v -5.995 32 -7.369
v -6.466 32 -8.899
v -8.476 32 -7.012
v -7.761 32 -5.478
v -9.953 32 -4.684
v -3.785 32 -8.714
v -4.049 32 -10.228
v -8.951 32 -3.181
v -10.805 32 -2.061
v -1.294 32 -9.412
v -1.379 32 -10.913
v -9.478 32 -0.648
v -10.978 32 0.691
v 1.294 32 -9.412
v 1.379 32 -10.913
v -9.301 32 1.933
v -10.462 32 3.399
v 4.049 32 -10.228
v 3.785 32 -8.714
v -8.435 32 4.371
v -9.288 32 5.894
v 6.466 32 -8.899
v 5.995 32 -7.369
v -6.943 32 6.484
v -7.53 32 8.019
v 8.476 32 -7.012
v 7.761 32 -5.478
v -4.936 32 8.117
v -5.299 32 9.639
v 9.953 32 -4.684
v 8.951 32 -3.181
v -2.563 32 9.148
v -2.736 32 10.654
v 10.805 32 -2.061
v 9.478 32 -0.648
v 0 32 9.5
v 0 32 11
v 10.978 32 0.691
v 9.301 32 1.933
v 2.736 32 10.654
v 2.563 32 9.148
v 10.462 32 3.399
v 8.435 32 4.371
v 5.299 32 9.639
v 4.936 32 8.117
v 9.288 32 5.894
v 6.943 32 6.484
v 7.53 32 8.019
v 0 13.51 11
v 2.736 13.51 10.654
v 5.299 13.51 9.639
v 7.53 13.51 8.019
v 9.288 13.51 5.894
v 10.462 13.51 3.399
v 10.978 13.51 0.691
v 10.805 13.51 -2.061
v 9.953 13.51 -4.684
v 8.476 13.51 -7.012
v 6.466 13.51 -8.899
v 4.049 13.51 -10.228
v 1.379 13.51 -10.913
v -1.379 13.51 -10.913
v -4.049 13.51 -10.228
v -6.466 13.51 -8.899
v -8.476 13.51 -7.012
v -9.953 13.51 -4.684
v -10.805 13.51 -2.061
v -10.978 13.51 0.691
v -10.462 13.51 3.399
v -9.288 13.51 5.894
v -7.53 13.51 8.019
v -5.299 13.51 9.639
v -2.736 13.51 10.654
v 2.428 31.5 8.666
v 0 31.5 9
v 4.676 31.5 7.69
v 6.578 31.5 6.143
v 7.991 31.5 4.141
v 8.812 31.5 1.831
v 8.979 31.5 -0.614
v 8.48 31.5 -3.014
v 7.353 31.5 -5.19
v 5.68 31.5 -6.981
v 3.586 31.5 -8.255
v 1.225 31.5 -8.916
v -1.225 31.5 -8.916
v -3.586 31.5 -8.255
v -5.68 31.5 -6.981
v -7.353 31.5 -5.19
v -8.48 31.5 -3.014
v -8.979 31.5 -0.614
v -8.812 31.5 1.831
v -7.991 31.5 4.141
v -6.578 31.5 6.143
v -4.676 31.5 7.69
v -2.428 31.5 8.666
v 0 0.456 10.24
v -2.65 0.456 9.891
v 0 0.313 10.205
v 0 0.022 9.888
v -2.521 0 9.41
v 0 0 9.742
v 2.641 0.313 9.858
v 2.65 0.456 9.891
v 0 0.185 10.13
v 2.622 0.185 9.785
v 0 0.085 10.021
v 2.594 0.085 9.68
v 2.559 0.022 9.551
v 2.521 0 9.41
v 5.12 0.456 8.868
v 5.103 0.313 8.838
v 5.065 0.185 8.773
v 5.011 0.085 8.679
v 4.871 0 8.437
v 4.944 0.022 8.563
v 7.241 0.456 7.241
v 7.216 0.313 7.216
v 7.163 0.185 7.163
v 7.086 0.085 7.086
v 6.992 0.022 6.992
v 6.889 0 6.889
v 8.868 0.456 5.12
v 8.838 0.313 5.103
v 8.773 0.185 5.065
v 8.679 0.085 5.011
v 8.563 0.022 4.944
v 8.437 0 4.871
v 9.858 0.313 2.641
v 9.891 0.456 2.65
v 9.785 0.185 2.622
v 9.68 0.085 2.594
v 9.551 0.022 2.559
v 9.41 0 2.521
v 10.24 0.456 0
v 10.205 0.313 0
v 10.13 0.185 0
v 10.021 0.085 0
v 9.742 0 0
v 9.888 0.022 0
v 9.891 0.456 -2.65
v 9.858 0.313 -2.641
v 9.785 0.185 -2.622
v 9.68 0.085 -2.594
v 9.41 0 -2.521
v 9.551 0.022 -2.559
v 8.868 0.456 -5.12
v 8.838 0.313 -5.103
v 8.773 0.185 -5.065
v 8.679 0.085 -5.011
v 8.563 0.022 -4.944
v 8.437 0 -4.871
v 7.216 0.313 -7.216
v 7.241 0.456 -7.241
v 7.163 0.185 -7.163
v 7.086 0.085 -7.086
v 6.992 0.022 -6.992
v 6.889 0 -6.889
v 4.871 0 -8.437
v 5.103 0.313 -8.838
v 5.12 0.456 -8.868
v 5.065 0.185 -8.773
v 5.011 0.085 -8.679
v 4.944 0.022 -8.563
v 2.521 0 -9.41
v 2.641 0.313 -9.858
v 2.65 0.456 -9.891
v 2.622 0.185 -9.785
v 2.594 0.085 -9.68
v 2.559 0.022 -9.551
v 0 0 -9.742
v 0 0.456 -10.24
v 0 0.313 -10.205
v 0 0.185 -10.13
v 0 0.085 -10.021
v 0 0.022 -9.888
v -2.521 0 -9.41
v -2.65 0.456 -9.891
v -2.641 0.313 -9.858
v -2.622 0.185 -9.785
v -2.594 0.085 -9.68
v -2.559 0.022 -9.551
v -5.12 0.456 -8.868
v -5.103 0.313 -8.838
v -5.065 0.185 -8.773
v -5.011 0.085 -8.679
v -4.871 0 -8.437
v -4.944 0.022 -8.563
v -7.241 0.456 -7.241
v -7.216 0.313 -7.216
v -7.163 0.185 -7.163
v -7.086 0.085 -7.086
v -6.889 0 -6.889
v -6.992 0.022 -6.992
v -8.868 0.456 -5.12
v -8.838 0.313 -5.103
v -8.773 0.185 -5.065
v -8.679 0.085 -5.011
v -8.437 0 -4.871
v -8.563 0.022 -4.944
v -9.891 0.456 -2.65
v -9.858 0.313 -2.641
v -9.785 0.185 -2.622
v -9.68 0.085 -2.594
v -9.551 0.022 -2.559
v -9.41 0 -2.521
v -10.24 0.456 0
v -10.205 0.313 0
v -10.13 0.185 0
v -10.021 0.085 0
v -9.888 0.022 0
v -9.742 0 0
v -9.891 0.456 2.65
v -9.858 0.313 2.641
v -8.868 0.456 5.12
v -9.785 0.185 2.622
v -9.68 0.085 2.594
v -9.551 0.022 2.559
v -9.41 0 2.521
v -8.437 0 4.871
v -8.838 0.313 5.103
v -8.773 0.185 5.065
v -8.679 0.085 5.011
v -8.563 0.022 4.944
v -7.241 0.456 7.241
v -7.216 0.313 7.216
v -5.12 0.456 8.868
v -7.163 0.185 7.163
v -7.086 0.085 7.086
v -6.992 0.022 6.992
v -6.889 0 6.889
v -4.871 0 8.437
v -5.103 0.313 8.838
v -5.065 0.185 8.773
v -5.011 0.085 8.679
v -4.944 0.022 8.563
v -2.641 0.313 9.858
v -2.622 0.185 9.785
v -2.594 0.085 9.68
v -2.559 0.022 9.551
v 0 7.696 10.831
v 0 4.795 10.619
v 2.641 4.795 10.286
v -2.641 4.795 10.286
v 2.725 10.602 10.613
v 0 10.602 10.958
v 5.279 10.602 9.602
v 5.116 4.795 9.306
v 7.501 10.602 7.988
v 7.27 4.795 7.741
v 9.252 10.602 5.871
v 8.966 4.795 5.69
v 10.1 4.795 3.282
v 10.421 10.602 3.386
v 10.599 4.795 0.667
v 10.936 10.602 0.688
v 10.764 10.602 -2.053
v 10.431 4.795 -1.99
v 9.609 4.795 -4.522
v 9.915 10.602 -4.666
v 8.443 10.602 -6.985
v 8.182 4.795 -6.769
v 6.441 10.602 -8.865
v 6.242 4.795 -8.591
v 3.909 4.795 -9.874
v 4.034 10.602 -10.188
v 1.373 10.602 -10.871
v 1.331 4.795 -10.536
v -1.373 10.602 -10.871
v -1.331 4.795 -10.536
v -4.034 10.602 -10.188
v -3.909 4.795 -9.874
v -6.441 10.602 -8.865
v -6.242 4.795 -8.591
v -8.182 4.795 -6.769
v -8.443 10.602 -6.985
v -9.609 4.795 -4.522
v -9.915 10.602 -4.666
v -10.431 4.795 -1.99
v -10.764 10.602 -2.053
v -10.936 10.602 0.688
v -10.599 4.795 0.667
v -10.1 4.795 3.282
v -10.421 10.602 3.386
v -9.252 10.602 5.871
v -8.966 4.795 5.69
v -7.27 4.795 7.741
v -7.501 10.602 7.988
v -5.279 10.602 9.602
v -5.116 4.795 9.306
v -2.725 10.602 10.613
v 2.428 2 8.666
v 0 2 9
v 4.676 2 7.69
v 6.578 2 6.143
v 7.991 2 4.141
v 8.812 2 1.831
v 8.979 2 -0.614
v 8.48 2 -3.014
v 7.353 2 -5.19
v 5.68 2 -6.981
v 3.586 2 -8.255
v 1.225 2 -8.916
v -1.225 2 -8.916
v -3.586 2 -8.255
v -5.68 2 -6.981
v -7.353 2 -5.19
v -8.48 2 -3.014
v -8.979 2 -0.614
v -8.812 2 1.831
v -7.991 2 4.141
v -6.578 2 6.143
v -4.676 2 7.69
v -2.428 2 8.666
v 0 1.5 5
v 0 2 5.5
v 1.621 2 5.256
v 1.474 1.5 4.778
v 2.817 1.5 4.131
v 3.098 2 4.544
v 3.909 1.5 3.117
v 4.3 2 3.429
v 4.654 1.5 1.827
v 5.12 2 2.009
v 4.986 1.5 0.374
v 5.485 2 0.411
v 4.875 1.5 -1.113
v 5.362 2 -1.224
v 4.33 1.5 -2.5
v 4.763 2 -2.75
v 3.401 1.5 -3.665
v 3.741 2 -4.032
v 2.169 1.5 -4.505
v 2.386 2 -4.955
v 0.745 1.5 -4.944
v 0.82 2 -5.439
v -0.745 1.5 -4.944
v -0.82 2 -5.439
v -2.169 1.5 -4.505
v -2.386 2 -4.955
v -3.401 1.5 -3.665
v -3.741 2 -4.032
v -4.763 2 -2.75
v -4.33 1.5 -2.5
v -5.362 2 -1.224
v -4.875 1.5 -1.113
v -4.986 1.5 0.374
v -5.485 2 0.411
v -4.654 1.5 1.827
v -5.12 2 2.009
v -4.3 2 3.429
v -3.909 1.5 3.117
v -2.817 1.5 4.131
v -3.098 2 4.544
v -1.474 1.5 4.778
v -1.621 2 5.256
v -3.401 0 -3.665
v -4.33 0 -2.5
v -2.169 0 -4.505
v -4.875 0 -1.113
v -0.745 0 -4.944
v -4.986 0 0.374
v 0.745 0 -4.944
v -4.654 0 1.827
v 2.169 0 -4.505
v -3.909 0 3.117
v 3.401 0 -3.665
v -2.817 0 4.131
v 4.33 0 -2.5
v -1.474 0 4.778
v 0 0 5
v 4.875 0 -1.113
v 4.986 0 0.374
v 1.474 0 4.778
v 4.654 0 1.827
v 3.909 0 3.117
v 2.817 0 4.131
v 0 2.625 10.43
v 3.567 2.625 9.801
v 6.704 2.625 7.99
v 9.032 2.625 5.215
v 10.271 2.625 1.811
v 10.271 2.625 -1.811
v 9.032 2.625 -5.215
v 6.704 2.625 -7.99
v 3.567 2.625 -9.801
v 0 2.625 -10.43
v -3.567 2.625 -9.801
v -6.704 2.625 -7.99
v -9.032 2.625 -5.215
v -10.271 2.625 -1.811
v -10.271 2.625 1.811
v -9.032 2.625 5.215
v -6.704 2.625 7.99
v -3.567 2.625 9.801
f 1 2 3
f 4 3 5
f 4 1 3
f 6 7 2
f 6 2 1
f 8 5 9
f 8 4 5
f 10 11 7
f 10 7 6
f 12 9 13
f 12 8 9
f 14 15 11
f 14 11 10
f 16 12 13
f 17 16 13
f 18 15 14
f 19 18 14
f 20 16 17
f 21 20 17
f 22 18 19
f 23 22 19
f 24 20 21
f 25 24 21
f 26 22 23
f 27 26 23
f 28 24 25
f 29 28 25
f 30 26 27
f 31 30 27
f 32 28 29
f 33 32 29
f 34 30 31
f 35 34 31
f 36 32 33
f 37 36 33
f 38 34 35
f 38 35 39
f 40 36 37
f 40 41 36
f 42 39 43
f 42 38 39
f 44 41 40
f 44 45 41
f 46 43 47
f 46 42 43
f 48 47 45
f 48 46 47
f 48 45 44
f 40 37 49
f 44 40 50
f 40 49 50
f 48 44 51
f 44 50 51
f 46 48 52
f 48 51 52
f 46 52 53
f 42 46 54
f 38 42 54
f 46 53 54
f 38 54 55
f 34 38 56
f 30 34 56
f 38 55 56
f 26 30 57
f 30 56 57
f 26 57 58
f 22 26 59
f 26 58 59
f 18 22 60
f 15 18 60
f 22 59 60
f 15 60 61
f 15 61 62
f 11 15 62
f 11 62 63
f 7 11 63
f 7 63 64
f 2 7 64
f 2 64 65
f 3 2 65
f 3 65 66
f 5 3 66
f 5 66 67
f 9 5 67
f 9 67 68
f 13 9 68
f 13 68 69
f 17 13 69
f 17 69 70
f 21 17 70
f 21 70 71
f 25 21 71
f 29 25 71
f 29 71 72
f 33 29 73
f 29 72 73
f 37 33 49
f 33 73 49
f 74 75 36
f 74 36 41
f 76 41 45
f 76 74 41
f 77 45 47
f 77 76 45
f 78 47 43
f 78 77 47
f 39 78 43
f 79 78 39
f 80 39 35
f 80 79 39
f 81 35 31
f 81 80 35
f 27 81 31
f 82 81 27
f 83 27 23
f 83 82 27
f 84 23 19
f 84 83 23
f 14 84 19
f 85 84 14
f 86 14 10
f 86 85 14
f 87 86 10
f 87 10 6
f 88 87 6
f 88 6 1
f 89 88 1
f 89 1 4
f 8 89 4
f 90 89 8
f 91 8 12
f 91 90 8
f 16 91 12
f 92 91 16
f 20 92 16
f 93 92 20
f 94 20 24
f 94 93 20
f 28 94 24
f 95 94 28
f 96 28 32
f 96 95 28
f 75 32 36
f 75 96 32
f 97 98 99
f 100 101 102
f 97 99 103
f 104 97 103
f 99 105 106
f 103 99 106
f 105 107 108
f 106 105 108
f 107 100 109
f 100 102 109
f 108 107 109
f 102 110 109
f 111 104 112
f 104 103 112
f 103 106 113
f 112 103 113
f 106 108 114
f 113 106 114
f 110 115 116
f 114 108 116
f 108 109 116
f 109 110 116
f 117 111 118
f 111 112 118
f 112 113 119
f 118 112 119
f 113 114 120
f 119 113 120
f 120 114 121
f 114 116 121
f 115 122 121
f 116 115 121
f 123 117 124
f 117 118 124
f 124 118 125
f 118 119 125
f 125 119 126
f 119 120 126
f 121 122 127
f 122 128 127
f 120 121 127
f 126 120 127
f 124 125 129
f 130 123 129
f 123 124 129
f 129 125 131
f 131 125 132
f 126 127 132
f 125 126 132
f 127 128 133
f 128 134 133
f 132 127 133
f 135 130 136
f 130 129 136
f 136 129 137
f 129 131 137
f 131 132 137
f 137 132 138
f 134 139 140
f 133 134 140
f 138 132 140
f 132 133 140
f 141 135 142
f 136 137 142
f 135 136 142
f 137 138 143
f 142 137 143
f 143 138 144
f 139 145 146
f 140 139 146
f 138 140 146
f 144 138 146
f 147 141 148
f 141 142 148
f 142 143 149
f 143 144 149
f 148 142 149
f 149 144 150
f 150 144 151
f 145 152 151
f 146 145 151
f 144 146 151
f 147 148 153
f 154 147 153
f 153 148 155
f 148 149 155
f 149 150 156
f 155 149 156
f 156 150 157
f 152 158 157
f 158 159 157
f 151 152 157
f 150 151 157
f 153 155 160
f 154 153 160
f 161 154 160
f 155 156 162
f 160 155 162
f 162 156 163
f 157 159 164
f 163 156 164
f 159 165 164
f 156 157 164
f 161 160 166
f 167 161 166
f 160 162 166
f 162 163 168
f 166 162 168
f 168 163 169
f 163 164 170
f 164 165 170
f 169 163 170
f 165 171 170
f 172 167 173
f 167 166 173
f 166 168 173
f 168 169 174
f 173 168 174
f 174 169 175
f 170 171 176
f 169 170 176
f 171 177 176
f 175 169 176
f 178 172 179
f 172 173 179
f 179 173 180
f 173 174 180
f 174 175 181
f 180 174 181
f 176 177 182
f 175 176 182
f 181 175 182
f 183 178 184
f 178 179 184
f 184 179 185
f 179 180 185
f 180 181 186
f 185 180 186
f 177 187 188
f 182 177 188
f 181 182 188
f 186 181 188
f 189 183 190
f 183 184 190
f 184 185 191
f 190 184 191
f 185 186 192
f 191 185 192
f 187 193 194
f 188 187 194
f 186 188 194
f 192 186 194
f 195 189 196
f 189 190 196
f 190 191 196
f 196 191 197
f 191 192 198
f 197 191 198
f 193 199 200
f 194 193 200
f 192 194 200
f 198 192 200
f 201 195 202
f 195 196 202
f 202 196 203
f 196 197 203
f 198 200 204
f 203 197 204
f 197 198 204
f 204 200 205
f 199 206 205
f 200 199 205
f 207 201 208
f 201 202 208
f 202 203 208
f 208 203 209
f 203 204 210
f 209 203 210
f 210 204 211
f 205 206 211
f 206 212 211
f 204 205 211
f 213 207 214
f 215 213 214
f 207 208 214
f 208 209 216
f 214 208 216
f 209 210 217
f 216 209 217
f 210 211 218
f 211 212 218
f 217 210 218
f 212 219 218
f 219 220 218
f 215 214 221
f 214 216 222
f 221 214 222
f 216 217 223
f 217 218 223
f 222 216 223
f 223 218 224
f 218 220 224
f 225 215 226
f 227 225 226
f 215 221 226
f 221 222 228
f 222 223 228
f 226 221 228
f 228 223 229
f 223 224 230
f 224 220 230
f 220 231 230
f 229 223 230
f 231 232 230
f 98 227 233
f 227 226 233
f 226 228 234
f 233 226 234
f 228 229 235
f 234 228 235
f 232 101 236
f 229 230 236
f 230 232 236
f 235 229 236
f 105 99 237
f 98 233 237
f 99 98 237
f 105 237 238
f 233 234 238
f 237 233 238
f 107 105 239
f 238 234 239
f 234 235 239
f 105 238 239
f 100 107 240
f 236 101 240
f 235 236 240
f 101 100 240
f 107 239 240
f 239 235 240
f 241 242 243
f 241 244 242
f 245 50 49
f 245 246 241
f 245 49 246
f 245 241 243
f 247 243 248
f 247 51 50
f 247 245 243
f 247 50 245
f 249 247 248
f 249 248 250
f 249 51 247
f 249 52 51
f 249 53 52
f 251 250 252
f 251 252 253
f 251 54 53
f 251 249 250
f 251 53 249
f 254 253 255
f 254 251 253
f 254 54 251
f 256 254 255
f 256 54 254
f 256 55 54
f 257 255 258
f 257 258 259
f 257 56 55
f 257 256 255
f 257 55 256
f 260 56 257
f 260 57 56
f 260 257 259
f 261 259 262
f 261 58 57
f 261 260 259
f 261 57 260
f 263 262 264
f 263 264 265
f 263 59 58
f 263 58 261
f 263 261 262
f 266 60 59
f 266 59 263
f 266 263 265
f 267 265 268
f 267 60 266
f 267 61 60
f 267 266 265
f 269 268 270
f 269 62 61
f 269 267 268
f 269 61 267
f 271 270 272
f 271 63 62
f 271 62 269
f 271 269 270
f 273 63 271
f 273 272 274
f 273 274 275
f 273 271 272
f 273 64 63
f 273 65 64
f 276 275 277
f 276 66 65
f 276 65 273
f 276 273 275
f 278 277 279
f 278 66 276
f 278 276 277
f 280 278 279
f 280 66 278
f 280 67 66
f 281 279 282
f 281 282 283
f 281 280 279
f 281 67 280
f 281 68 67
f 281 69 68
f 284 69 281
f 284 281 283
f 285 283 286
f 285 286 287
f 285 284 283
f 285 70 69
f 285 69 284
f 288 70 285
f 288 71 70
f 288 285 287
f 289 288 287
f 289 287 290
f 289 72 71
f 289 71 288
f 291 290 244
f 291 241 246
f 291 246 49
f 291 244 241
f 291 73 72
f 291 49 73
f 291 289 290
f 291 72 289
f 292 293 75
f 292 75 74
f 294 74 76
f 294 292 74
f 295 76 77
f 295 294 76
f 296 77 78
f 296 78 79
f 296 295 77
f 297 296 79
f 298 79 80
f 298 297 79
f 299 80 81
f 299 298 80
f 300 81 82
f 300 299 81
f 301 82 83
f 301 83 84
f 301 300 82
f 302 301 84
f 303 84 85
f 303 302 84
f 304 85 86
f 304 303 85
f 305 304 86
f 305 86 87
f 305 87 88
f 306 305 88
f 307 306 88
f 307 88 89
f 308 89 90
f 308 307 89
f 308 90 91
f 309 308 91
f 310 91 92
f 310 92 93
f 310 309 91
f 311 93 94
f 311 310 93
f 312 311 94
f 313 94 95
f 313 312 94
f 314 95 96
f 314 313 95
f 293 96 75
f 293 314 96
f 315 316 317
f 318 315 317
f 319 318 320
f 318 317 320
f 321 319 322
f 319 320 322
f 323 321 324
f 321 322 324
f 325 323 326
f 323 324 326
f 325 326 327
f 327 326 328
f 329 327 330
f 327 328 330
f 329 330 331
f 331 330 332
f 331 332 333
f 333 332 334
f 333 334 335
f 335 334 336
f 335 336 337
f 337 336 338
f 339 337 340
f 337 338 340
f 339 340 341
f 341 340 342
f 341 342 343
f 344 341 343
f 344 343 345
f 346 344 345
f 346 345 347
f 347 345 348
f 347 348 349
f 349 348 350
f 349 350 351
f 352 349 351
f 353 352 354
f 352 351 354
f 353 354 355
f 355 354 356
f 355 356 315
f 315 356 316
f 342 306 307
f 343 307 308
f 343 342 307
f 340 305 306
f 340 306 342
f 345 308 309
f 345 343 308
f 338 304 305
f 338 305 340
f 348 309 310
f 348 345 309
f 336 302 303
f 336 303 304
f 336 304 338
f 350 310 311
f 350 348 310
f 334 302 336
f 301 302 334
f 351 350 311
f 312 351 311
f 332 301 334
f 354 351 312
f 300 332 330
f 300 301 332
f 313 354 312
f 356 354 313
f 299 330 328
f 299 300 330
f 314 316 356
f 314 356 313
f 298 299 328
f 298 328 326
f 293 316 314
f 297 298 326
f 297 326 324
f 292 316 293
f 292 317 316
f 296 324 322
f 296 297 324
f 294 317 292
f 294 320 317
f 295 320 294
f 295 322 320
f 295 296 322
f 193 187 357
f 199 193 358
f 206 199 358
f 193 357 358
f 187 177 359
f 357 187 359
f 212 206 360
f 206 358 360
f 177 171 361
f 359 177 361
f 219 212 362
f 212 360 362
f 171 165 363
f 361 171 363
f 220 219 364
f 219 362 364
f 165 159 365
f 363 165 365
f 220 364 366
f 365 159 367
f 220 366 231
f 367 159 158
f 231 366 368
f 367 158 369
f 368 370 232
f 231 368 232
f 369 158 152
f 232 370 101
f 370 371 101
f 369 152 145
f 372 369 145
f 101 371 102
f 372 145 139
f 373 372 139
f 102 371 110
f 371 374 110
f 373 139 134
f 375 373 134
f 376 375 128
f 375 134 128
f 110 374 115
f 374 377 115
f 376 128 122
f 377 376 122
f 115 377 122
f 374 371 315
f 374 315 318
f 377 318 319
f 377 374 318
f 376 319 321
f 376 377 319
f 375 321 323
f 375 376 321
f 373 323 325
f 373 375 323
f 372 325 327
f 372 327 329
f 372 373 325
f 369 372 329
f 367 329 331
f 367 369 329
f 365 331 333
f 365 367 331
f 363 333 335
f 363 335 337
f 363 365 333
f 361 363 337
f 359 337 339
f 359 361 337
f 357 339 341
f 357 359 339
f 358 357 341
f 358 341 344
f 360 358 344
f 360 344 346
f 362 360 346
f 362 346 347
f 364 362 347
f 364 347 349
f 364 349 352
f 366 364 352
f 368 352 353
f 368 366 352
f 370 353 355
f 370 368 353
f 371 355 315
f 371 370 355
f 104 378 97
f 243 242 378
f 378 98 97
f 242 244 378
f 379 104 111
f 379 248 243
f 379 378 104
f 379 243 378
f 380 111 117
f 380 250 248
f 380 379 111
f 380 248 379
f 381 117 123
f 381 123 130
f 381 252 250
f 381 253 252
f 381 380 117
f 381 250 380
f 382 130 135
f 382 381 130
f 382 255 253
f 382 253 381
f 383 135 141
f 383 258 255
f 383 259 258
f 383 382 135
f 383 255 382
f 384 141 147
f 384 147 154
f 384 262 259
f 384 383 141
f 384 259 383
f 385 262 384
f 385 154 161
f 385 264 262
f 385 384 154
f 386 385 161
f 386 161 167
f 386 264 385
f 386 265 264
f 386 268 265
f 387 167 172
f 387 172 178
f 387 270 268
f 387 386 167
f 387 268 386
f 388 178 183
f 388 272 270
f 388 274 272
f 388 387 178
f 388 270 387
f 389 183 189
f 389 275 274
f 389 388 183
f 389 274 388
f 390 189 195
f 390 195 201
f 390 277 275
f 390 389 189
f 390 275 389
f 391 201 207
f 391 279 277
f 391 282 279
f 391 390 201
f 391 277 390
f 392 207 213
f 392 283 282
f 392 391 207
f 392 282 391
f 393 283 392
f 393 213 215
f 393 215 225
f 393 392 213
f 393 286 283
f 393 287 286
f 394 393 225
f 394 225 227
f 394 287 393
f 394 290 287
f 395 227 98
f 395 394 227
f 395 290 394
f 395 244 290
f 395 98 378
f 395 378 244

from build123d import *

# Parameters (mm, degrees)
SKETCH1_R           = 11
SKETCH1_R_2         = 5
BOSS_EXTRUDE1_DEPTH = 2
SKETCH2_R           = 11
SKETCH2_R_2         = 9
BOSS_EXTRUDE2_DEPTH = 30
CHAMFER1_SIZE       = 0.8
CHAMFER1_SIZE2      = 9.144041842
CHAMFER2_SIZE       = 0.5
FILLET1_R           = 0.5
FILLET2_R           = 100
CHAMFER3_SIZE       = 0.5


with BuildPart() as part:
    # Sketch1 → Boss-Extrude1 (new body)
    with BuildSketch(Plane(origin=(0, 0, 0), x_dir=(1, 0, 0), z_dir=(0, 1, 0))):
        with Locations(Location((0, 0, 0), (0, 0, 270))):
            Circle(SKETCH1_R)
        with Locations(Location((0, 0, 0), (0, 0, 270))):
            Circle(SKETCH1_R_2, mode=Mode.SUBTRACT)
    extrude(amount=BOSS_EXTRUDE1_DEPTH)

    # Sketch2 → Boss-Extrude2 (add)
    with BuildSketch(Plane(origin=(0, 2, 0), x_dir=(1, 0, 0), z_dir=(0, 1, 0))):
        with Locations(Location((0, 0, 0), (0, 0, 270))):
            Circle(SKETCH2_R)
        with Locations(Location((0, 0, 0), (0, 0, 270))):
            Circle(SKETCH2_R_2, mode=Mode.SUBTRACT)
    extrude(amount=BOSS_EXTRUDE2_DEPTH)

    # Chamfer1
    chamfer1_edges = [part.edges().sort_by_distance(p)[0] for p in [
        (0, 0, -11),
    ]]
    chamfer1_side = [part.faces().sort_by_distance(p)[0] for p in [
        (0, 0, -10.688873016),
    ]]
    chamfer(chamfer1_edges, length=CHAMFER1_SIZE, length2=CHAMFER1_SIZE2, reference=chamfer1_side[0])

    # Chamfer2
    chamfer2_edges = [part.edges().sort_by_distance(p)[0] for p in [
        (0, 32, -9),
    ]]
    chamfer(chamfer2_edges, length=CHAMFER2_SIZE)

    # Fillet1
    fillet1_edges = [part.edges().sort_by_distance(p)[0] for p in [
        (0, 0, -10.2),
    ]]
    fillet(fillet1_edges, radius=FILLET1_R)

    # Fillet2
    # the kernel refuses this fillet: 100 mm, written as the material it takes off along each edge
    with BuildSketch(Plane(origin=(0, 9.144041842, 0), x_dir=(0, 0, 1), z_dir=(-1, 0, 0))) as fillet2_piece_1:
        with BuildLine():
            CenterArc((11 - FILLET2_R, FILLET2_R * 0.0436609429085), FILLET2_R, 355, 5)
            Line((11, FILLET2_R * 0.0436609429085), (11, 0))
            Line((11, 0), (11 - FILLET2_R * 0.00380530190825, -FILLET2_R * 0.0434947998391))
        make_face()
    revolve(axis=Axis((0, 9.144041842, 0), (0, 1, 0)), mode=Mode.SUBTRACT)

    # Chamfer3
    chamfer3_edges = [part.edges().sort_by_distance(p)[0] for p in [
        (0, 2, -5),
    ]]
    chamfer(chamfer3_edges, length=CHAMFER3_SIZE)


solid = part.part
